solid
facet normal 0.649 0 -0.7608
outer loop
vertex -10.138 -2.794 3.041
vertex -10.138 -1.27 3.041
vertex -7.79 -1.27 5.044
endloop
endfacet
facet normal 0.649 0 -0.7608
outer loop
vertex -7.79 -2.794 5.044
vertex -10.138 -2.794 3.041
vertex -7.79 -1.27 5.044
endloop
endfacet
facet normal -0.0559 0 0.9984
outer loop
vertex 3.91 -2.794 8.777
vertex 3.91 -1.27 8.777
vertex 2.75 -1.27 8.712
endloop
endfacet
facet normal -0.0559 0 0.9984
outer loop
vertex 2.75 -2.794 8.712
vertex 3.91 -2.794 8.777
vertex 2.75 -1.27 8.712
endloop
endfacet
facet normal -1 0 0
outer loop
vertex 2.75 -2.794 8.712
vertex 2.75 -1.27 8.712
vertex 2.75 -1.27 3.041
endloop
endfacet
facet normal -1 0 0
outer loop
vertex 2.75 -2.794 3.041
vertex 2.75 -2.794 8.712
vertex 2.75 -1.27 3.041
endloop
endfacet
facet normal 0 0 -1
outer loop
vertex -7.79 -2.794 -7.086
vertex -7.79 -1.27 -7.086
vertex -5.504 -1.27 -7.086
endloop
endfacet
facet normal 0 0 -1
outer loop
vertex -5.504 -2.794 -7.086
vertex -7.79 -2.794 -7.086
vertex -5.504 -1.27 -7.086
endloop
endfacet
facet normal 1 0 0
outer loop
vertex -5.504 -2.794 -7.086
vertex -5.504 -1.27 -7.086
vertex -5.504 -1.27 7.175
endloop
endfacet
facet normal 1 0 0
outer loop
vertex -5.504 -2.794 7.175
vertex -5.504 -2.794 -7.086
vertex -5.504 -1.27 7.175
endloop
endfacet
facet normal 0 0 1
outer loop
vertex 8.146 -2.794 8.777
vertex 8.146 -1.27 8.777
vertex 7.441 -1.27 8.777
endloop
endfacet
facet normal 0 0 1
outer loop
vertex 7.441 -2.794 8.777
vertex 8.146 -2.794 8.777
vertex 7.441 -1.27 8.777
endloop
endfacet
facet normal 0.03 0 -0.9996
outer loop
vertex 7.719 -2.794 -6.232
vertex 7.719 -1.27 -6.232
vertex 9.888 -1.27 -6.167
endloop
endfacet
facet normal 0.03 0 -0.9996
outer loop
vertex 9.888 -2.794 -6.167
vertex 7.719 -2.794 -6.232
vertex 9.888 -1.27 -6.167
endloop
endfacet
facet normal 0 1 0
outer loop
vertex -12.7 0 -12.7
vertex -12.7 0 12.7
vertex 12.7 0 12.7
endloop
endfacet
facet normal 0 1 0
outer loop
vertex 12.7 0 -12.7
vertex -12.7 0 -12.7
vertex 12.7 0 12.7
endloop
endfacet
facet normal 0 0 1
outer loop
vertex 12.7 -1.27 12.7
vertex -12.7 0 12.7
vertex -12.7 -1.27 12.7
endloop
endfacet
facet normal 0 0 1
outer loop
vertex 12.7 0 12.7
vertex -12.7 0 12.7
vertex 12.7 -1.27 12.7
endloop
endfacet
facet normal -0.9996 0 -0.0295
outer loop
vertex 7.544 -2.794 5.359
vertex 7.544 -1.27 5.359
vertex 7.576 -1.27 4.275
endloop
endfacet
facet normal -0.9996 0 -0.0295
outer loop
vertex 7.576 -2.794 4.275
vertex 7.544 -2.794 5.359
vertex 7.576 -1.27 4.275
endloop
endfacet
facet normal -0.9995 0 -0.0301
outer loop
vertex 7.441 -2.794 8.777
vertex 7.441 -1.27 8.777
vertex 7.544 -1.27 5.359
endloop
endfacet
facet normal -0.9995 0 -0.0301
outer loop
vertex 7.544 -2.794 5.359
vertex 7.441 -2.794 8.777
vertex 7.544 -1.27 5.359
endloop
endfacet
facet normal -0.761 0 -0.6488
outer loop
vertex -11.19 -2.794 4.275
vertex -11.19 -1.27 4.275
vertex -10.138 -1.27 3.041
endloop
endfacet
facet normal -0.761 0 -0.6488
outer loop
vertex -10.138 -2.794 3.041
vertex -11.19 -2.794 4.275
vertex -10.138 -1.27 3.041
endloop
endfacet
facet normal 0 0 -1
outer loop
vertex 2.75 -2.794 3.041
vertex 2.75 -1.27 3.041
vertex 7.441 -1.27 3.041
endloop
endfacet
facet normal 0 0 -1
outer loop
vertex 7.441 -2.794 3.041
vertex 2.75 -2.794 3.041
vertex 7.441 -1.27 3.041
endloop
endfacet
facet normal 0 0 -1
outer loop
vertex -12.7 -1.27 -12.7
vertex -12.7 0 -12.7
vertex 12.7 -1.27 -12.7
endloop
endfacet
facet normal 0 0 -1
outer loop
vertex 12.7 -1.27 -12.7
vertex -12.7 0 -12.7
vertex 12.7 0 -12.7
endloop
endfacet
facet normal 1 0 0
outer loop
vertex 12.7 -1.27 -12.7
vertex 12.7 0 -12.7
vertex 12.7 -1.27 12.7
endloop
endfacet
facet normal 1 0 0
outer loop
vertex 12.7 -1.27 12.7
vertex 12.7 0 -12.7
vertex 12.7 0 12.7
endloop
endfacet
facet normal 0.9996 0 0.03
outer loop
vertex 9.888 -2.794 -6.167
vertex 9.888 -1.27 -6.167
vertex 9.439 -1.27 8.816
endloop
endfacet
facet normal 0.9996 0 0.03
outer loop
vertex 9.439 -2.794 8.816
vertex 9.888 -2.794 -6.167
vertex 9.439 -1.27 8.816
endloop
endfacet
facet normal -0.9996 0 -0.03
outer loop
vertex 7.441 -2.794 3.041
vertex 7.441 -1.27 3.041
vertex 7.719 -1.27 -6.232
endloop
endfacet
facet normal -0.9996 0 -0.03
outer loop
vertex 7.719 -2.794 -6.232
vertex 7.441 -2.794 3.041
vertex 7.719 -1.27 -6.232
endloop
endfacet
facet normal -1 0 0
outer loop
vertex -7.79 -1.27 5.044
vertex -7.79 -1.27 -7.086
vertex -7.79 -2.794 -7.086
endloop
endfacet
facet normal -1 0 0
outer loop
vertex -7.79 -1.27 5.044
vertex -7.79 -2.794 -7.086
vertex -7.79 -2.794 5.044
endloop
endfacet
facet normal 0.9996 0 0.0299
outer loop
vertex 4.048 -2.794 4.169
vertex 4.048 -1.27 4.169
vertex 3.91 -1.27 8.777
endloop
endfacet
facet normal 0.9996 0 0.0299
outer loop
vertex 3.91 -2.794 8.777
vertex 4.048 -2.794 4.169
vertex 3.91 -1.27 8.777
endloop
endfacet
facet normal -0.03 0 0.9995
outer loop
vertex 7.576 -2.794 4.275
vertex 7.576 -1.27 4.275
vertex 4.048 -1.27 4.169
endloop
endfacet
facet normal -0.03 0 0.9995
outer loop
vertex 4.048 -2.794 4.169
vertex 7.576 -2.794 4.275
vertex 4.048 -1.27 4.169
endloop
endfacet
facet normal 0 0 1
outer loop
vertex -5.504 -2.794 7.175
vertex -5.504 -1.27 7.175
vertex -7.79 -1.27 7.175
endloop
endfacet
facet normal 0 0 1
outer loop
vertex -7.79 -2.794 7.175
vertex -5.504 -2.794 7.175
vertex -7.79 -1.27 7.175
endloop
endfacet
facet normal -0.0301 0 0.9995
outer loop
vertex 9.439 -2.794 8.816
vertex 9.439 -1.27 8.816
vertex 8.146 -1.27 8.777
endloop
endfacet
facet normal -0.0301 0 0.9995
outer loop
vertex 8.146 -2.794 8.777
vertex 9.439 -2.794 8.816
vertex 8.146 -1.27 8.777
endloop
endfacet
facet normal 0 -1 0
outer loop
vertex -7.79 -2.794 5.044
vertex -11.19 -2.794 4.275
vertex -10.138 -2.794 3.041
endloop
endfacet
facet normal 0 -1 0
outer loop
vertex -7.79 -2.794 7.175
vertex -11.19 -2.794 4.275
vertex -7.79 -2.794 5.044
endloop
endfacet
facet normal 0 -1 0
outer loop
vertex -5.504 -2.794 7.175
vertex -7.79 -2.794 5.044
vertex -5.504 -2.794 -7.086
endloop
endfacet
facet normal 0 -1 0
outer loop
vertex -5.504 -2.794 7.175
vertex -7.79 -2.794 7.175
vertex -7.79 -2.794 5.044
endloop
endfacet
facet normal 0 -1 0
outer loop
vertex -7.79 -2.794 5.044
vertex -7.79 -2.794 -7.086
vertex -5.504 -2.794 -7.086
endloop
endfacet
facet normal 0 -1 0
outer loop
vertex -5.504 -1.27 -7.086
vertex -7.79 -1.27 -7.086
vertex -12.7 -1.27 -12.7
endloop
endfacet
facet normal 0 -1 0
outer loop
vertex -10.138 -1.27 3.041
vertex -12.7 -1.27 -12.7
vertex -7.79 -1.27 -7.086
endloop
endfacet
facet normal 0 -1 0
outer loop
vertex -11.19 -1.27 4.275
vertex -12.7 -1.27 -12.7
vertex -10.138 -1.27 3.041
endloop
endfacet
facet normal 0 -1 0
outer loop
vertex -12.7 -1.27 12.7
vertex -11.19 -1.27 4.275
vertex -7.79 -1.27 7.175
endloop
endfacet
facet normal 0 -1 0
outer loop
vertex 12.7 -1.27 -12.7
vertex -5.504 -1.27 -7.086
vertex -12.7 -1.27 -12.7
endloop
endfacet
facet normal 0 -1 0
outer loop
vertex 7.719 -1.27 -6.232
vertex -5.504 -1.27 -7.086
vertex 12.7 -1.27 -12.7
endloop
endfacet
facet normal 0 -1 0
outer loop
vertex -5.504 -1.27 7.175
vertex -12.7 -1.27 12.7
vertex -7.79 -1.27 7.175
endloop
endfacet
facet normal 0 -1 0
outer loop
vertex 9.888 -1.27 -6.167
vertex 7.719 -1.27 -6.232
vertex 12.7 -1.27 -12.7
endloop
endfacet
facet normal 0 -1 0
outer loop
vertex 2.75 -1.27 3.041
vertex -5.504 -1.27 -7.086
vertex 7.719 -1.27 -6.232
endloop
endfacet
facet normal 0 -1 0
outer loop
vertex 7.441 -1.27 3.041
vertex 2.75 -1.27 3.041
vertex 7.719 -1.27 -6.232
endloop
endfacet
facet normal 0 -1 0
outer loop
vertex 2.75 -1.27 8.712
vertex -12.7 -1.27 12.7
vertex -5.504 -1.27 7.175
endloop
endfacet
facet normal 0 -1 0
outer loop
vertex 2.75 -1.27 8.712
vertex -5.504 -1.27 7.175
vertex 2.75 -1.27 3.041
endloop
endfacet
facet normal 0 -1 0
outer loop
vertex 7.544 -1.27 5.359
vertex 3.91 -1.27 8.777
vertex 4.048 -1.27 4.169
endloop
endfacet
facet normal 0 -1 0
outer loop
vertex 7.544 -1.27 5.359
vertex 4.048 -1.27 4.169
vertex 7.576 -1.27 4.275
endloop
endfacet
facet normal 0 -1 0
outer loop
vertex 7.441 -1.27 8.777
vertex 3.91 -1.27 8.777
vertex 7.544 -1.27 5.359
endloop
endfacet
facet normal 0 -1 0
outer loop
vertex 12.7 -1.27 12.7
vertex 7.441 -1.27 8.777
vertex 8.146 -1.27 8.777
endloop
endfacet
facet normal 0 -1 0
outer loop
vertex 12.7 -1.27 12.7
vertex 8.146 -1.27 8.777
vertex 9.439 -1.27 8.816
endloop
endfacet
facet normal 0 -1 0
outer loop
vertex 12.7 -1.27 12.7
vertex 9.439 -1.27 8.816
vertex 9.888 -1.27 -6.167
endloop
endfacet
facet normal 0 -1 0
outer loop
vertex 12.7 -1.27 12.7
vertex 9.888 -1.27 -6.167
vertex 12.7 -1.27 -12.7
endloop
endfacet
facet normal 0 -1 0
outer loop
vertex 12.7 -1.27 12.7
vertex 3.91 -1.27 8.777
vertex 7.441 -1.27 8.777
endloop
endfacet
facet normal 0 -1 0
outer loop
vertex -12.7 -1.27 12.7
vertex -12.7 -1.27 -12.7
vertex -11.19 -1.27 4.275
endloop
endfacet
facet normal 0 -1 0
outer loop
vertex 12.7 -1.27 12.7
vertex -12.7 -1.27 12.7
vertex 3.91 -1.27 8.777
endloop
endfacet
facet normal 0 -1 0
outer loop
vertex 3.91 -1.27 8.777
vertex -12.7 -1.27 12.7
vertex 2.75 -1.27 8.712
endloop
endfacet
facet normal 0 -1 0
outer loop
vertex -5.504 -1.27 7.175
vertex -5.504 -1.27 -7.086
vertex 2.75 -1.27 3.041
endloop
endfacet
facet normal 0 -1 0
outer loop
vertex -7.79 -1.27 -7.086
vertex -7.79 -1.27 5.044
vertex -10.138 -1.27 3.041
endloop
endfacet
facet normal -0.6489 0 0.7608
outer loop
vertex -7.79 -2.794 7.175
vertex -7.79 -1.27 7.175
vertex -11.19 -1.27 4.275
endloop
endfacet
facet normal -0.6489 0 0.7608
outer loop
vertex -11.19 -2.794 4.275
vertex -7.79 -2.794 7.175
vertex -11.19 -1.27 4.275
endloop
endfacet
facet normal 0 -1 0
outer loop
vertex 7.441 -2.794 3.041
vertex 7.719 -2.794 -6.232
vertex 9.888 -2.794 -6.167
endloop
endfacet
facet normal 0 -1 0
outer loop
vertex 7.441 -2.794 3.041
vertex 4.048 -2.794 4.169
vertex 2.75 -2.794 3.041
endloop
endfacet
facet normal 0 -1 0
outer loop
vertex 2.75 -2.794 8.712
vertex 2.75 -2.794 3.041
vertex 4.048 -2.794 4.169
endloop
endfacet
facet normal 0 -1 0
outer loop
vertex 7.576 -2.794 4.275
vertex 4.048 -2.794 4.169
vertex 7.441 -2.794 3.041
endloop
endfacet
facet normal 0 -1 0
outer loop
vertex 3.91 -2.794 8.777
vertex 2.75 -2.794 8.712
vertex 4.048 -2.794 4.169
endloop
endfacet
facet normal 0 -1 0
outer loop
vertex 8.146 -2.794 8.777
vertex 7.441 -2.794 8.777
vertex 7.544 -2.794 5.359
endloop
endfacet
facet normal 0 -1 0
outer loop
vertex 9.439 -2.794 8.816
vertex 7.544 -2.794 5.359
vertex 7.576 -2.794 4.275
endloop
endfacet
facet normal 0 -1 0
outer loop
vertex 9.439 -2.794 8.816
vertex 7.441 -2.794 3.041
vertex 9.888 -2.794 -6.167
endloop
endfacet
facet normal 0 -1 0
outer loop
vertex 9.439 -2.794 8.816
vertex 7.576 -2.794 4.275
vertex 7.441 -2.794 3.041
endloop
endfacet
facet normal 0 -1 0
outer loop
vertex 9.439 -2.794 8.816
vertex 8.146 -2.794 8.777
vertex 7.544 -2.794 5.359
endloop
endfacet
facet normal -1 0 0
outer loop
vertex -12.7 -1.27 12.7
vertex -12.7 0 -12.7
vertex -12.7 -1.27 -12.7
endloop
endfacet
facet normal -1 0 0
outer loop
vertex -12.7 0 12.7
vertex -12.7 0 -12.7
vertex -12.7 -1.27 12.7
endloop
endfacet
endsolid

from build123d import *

# Parameters (mm, degrees)
F0_W     = 25.4
F0_H     = 25.4
F1_DEPTH = 1.27
F3_DEPTH = 1.524
F4_DEPTH = 1.524
F5_W     = 2.286
F5_H     = 1.560336
F6_DEPTH = 1.524


with BuildPart() as f1:
    # F0 (on Front) → F1 (new body)
    with BuildSketch(Plane.XZ):
        Rectangle(F0_W, F0_H)
    extrude(amount=F1_DEPTH)

    # F2 (on face) → F3 (join)
    with BuildSketch(Plane.XZ.offset(1.27)):
        Polygon((-10.138285, 3.041435), (-7.790129, 5.044031), (-7.790129, 7.174698), (-11.190262, 4.274936), align=None)
        Polygon((-7.790129, 5.044031), (-7.790129, -5.525302), (-5.504129, -5.525302), (-5.504129, 7.174698), (-7.790129, 7.174698), align=None)
    extrude(amount=F3_DEPTH)

    # F2 (on face) → F4 (join)
    with BuildSketch(Plane.XZ.offset(1.27)):
        Polygon((-7.790129, 5.044031), (-7.790129, -5.525302), (-5.504129, -5.525302), (-5.504129, 7.174698), (-7.790129, 7.174698), align=None)
        Polygon((-10.138285, 3.041435), (-7.790129, 5.044031), (-7.790129, 7.174698), (-11.190262, 4.274936), align=None)
        Polygon((3.909726, 8.777335), (2.750006, 8.712334), (2.750006, 3.041435), (7.441319, 3.041435), (7.719035, -6.231733), (9.88784, -6.166781), (9.439128, 8.816055), (8.14623, 8.777335), (7.441319, 8.777335), (7.543693, 5.358965), (7.576158, 4.274936), (4.04773, 4.169265), align=None)
    extrude(amount=F4_DEPTH)

    # F5 (on face) → F6 (join)
    with BuildSketch(Plane.XZ.offset(1.27)):
        with Locations((-6.647129, -6.30547)):
            Rectangle(F5_W, F5_H)
    extrude(amount=F6_DEPTH)


solid = f1.part
